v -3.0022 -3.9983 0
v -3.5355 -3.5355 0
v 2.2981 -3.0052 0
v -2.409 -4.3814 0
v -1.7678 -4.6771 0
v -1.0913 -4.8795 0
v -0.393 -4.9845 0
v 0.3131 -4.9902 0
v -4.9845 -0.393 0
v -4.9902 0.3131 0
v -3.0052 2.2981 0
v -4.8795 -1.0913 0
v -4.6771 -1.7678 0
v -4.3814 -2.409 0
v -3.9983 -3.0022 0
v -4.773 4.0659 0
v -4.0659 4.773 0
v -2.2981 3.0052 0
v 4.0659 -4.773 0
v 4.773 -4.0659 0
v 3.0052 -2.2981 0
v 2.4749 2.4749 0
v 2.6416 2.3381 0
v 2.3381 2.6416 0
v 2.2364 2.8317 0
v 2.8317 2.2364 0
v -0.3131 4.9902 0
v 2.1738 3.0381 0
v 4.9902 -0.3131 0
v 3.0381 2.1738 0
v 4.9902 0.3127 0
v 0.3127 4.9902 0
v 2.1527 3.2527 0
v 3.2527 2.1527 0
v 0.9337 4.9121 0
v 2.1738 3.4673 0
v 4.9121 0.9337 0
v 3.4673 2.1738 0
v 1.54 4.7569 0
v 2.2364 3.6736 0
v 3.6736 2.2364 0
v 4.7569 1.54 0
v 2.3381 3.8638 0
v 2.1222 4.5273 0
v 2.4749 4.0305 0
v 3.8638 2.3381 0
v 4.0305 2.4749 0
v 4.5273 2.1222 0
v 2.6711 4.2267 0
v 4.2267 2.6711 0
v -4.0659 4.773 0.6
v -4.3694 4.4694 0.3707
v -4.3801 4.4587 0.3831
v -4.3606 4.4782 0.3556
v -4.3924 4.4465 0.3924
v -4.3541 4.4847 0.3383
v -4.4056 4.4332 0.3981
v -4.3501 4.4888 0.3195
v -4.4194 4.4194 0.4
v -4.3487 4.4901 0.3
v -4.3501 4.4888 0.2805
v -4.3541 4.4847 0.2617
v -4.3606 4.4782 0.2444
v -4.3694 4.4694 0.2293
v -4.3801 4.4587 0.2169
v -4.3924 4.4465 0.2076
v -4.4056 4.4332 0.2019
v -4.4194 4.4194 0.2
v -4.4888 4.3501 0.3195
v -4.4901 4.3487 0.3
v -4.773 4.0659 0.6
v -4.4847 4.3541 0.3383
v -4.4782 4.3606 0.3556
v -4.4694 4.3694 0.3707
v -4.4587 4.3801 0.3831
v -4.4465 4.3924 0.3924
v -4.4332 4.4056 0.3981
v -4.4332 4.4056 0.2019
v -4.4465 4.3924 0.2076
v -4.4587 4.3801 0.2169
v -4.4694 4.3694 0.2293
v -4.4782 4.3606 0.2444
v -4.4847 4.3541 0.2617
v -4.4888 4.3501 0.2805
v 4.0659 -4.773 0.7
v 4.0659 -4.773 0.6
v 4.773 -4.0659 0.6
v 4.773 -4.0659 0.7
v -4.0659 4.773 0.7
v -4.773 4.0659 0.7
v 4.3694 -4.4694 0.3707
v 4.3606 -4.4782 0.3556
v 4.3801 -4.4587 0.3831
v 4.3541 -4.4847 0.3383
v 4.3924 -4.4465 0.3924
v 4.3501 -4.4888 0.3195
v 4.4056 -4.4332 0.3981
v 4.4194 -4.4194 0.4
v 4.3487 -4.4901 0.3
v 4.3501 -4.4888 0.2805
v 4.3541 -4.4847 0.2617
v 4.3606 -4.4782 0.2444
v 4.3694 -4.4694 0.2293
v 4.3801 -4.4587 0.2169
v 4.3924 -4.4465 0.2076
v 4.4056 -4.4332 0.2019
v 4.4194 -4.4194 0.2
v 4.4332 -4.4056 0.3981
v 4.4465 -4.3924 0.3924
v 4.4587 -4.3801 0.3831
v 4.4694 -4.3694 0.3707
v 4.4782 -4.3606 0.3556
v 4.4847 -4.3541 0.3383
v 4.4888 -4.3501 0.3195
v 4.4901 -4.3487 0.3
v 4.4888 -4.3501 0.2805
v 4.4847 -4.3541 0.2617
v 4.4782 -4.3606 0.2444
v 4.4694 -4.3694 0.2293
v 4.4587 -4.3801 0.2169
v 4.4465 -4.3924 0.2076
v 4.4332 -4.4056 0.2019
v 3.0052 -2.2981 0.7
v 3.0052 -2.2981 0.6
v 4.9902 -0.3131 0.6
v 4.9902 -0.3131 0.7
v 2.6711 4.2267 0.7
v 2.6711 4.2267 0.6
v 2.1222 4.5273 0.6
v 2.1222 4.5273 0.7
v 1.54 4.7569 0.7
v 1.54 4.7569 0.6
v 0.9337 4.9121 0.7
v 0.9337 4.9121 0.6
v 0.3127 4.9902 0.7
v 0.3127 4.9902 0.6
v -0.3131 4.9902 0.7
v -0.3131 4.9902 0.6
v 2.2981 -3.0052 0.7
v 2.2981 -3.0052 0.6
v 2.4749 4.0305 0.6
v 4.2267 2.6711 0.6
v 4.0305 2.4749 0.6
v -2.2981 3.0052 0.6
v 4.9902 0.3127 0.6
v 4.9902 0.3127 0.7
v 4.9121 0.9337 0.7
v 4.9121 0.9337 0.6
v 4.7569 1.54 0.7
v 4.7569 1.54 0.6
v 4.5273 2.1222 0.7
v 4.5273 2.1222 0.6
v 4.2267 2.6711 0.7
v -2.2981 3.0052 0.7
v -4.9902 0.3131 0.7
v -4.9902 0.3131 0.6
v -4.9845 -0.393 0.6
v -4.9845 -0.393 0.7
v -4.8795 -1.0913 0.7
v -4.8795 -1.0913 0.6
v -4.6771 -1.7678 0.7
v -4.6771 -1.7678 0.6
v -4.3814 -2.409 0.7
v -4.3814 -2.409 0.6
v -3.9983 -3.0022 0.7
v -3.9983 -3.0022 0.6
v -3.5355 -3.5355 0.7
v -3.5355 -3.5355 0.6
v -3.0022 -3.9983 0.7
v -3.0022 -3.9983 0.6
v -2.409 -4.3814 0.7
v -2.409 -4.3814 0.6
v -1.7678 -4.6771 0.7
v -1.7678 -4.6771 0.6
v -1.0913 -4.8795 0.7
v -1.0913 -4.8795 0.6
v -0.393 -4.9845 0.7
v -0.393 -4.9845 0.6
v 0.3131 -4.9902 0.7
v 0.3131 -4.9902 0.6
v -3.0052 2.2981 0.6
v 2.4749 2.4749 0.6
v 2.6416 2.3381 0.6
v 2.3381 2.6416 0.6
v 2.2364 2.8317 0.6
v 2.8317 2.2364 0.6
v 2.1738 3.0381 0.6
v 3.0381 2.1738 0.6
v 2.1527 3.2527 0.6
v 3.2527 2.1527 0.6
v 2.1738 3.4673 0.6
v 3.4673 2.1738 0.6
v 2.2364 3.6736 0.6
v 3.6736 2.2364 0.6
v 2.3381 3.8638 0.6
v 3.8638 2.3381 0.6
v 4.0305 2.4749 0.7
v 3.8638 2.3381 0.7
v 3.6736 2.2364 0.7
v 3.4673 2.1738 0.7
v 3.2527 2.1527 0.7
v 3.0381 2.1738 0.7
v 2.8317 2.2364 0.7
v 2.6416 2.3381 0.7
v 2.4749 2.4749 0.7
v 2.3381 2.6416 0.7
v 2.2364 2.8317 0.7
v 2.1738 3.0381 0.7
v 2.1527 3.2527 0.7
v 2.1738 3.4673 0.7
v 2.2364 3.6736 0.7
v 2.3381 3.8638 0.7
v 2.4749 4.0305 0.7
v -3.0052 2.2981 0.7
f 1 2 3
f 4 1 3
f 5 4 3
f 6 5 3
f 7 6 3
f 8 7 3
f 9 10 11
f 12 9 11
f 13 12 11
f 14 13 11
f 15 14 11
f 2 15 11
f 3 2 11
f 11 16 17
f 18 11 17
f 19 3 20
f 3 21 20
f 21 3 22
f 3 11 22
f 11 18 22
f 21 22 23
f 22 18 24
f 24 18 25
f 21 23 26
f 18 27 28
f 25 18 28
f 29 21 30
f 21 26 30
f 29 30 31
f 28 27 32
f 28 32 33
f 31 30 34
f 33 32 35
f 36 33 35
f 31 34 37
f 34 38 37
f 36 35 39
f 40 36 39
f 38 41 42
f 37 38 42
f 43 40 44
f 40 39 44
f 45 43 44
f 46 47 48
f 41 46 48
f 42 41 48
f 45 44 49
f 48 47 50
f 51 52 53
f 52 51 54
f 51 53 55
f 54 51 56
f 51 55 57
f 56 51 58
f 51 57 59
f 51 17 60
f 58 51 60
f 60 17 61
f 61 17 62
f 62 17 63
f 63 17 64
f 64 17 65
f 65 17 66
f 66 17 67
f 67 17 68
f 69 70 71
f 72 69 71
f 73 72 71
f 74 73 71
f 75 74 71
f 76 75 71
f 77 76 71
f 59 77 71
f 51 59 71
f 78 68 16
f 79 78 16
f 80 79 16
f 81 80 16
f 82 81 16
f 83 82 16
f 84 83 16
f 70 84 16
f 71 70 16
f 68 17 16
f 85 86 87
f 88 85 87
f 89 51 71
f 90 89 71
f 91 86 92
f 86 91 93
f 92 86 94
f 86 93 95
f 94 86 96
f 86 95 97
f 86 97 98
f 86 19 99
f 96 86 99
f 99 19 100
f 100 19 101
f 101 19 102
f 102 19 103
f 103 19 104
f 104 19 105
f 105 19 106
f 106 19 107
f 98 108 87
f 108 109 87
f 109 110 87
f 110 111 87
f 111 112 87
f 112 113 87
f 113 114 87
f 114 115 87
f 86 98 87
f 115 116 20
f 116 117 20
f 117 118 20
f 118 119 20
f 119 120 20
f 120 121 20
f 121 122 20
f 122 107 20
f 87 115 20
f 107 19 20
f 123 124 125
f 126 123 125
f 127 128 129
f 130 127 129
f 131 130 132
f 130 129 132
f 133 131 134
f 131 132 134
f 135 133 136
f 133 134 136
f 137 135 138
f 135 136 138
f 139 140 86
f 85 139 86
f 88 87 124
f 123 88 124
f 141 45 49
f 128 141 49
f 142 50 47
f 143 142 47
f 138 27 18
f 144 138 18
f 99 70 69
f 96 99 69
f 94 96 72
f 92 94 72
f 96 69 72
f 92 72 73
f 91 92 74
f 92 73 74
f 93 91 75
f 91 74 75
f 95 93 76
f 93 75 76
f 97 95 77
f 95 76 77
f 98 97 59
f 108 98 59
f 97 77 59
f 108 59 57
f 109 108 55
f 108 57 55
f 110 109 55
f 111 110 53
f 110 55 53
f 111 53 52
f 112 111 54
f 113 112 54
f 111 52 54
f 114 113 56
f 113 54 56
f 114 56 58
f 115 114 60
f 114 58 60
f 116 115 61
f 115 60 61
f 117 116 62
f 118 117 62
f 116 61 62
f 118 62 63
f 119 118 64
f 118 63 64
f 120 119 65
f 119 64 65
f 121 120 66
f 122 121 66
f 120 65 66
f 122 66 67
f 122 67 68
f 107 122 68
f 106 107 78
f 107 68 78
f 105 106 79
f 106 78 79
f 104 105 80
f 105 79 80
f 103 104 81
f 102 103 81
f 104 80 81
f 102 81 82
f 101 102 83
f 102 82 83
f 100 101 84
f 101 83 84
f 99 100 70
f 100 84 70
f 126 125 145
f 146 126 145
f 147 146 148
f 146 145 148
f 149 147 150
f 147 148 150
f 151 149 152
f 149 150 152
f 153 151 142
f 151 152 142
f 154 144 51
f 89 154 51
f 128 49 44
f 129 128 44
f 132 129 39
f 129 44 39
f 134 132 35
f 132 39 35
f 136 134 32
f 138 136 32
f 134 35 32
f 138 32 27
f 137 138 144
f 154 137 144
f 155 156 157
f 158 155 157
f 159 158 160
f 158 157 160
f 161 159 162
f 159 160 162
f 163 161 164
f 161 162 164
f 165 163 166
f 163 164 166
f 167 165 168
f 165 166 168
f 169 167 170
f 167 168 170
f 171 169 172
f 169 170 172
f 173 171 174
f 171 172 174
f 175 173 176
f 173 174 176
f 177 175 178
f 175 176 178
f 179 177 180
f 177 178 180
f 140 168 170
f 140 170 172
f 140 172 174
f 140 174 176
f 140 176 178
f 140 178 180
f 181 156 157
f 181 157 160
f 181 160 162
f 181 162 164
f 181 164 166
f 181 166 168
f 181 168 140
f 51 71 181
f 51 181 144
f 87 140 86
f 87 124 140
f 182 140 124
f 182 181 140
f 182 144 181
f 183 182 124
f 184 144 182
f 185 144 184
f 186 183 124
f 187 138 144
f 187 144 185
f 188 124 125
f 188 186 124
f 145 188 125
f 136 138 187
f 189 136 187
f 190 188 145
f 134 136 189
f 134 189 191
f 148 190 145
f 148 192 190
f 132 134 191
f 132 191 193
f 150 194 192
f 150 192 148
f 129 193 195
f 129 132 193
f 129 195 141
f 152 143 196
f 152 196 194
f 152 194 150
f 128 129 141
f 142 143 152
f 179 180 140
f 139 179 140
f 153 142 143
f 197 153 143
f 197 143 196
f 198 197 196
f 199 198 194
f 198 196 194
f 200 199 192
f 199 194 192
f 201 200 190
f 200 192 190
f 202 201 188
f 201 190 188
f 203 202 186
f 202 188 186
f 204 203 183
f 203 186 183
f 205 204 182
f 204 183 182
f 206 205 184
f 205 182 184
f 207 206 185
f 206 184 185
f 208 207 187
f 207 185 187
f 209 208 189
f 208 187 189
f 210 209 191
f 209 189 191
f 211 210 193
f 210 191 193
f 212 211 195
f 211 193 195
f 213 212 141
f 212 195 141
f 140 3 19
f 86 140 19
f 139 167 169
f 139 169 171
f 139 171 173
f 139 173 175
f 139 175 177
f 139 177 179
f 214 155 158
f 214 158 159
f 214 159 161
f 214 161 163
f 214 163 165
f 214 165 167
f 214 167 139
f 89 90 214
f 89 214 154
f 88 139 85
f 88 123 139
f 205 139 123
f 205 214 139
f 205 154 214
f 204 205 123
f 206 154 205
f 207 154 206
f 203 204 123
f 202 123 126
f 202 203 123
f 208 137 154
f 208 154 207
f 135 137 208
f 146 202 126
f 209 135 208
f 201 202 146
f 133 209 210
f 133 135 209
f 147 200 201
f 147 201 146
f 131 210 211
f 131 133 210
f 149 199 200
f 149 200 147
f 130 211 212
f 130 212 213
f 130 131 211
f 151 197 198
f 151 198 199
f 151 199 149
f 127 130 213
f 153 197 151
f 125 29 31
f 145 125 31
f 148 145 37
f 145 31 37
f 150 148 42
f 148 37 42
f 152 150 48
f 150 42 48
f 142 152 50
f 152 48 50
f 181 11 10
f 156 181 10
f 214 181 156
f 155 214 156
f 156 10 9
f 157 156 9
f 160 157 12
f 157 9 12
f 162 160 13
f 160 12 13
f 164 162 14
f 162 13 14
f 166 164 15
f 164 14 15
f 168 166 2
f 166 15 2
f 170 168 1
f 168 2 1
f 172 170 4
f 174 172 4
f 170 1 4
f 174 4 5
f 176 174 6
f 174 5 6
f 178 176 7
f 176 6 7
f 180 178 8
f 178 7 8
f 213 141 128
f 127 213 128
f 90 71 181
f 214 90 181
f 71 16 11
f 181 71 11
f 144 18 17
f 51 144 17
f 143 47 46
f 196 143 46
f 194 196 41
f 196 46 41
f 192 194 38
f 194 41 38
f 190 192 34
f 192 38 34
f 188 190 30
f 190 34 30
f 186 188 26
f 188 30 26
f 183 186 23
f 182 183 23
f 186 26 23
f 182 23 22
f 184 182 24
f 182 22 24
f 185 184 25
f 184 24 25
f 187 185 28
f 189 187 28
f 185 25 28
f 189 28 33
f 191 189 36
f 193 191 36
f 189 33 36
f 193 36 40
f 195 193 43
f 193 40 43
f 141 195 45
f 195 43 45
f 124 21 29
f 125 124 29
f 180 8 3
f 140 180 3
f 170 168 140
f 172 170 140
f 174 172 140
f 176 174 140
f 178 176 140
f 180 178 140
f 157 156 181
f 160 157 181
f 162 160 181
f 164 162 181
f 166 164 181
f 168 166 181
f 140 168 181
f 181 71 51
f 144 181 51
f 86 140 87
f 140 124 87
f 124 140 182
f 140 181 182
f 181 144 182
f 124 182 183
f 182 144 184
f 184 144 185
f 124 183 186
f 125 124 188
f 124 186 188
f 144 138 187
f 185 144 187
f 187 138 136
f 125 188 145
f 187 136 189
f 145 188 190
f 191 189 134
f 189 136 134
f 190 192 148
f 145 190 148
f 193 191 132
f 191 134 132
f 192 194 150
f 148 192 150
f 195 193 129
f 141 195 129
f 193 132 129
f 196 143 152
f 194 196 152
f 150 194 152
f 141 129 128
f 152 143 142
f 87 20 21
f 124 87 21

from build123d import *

# Parameters (mm, degrees)
F1_DEPTH = 0.6
F2_R     = 0.1
F3_DEPTH = 12.5
F5_DEPTH = 0.1


with BuildPart() as f1:
    # F0 (on Top) → F1 (new body)
    with BuildSketch(Plane.XY):
        with BuildLine():
            Line((-3.00520382, 2.2980970389), (-4.9901862962, 0.3131145627))
            ThreePointArc((-4.9901862962, 0.3131145627), (-3.5355339059, -3.5355339059), (0.3131145627, -4.9901862962))
            Line((0.3131145627, -4.9901862962), (2.2980970389, -3.00520382))
            Line((2.2980970389, -3.00520382), (4.0658639918, -4.772970773))
            Line((4.0658639918, -4.772970773), (4.772970773, -4.0658639918))
            Line((4.772970773, -4.0658639918), (3.00520382, -2.2980970389))
            Line((3.00520382, -2.2980970389), (4.9901862962, -0.3131145627))
            ThreePointArc((4.9901862962, -0.3131145627), (4.8439927049, 1.2392476245), (4.2267303315, 2.6710954129))
            Line((4.2267303315, 2.6710954129), (4.0305086528, 2.4748737342))
            ThreePointArc((4.0305086528, 2.4748737342), (2.4748737342, 2.4748737342), (2.4748737342, 4.0305086528))
            Line((2.4748737342, 4.0305086528), (2.6710954129, 4.2267303315))
            ThreePointArc((2.6710954129, 4.2267303315), (1.2392476245, 4.8439927049), (-0.3131145627, 4.9901862962))
            Line((-0.3131145627, 4.9901862962), (-2.2980970389, 3.00520382))
            Line((-2.2980970389, 3.00520382), (-4.0658639918, 4.772970773))
            Line((-4.0658639918, 4.772970773), (-4.772970773, 4.0658639918))
            Line((-4.772970773, 4.0658639918), (-3.00520382, 2.2980970389))
        make_face()
    extrude(amount=F1_DEPTH)

    # F2 (on face) → F3 (cut, through all)
    with BuildSketch(Plane(origin=(-4.4194173824, 4.4194173824, 0), x_dir=(-0.7071067812, -0.7071067812, 0), z_dir=(-0.7071067812, 0.7071067812, 0))):
        with Locations((0, 0.3)):
            Circle(F2_R)
    extrude(amount=-F3_DEPTH, mode=Mode.SUBTRACT)


with BuildPart() as f5:
    # F4 (on face) → F5 (new body)
    with BuildSketch(Plane.XY.offset(0.6)):
        with BuildLine():
            ThreePointArc((4.0305086528, 2.4748737342), (2.4748737342, 2.4748737342), (2.4748737342, 4.0305086528))
            Line((2.4748737342, 4.0305086528), (2.6710954129, 4.2267303315))
            ThreePointArc((2.6710954129, 4.2267303315), (1.2392476245, 4.8439927049), (-0.3131145627, 4.9901862962))
            Line((-0.3131145627, 4.9901862962), (-2.2980970389, 3.00520382))
            Line((-2.2980970389, 3.00520382), (-4.0658639918, 4.772970773))
            Line((-4.0658639918, 4.772970773), (-4.772970773, 4.0658639918))
            Line((-4.772970773, 4.0658639918), (-3.00520382, 2.2980970389))
            Line((-3.00520382, 2.2980970389), (-4.9901862962, 0.3131145627))
            ThreePointArc((-4.9901862962, 0.3131145627), (-3.5355339059, -3.5355339059), (0.3131145627, -4.9901862962))
            Line((0.3131145627, -4.9901862962), (2.2980970389, -3.00520382))
            Line((2.2980970389, -3.00520382), (4.0658639918, -4.772970773))
            Line((4.0658639918, -4.772970773), (4.772970773, -4.0658639918))
            Line((4.772970773, -4.0658639918), (3.00520382, -2.2980970389))
            Line((3.00520382, -2.2980970389), (4.9901862962, -0.3131145627))
            ThreePointArc((4.9901862962, -0.3131145627), (4.8439927049, 1.2392476245), (4.2267303315, 2.6710954129))
            Line((4.2267303315, 2.6710954129), (4.0305086528, 2.4748737342))
        make_face()
    extrude(amount=F5_DEPTH)


solid = Compound([f1.part, f5.part])
